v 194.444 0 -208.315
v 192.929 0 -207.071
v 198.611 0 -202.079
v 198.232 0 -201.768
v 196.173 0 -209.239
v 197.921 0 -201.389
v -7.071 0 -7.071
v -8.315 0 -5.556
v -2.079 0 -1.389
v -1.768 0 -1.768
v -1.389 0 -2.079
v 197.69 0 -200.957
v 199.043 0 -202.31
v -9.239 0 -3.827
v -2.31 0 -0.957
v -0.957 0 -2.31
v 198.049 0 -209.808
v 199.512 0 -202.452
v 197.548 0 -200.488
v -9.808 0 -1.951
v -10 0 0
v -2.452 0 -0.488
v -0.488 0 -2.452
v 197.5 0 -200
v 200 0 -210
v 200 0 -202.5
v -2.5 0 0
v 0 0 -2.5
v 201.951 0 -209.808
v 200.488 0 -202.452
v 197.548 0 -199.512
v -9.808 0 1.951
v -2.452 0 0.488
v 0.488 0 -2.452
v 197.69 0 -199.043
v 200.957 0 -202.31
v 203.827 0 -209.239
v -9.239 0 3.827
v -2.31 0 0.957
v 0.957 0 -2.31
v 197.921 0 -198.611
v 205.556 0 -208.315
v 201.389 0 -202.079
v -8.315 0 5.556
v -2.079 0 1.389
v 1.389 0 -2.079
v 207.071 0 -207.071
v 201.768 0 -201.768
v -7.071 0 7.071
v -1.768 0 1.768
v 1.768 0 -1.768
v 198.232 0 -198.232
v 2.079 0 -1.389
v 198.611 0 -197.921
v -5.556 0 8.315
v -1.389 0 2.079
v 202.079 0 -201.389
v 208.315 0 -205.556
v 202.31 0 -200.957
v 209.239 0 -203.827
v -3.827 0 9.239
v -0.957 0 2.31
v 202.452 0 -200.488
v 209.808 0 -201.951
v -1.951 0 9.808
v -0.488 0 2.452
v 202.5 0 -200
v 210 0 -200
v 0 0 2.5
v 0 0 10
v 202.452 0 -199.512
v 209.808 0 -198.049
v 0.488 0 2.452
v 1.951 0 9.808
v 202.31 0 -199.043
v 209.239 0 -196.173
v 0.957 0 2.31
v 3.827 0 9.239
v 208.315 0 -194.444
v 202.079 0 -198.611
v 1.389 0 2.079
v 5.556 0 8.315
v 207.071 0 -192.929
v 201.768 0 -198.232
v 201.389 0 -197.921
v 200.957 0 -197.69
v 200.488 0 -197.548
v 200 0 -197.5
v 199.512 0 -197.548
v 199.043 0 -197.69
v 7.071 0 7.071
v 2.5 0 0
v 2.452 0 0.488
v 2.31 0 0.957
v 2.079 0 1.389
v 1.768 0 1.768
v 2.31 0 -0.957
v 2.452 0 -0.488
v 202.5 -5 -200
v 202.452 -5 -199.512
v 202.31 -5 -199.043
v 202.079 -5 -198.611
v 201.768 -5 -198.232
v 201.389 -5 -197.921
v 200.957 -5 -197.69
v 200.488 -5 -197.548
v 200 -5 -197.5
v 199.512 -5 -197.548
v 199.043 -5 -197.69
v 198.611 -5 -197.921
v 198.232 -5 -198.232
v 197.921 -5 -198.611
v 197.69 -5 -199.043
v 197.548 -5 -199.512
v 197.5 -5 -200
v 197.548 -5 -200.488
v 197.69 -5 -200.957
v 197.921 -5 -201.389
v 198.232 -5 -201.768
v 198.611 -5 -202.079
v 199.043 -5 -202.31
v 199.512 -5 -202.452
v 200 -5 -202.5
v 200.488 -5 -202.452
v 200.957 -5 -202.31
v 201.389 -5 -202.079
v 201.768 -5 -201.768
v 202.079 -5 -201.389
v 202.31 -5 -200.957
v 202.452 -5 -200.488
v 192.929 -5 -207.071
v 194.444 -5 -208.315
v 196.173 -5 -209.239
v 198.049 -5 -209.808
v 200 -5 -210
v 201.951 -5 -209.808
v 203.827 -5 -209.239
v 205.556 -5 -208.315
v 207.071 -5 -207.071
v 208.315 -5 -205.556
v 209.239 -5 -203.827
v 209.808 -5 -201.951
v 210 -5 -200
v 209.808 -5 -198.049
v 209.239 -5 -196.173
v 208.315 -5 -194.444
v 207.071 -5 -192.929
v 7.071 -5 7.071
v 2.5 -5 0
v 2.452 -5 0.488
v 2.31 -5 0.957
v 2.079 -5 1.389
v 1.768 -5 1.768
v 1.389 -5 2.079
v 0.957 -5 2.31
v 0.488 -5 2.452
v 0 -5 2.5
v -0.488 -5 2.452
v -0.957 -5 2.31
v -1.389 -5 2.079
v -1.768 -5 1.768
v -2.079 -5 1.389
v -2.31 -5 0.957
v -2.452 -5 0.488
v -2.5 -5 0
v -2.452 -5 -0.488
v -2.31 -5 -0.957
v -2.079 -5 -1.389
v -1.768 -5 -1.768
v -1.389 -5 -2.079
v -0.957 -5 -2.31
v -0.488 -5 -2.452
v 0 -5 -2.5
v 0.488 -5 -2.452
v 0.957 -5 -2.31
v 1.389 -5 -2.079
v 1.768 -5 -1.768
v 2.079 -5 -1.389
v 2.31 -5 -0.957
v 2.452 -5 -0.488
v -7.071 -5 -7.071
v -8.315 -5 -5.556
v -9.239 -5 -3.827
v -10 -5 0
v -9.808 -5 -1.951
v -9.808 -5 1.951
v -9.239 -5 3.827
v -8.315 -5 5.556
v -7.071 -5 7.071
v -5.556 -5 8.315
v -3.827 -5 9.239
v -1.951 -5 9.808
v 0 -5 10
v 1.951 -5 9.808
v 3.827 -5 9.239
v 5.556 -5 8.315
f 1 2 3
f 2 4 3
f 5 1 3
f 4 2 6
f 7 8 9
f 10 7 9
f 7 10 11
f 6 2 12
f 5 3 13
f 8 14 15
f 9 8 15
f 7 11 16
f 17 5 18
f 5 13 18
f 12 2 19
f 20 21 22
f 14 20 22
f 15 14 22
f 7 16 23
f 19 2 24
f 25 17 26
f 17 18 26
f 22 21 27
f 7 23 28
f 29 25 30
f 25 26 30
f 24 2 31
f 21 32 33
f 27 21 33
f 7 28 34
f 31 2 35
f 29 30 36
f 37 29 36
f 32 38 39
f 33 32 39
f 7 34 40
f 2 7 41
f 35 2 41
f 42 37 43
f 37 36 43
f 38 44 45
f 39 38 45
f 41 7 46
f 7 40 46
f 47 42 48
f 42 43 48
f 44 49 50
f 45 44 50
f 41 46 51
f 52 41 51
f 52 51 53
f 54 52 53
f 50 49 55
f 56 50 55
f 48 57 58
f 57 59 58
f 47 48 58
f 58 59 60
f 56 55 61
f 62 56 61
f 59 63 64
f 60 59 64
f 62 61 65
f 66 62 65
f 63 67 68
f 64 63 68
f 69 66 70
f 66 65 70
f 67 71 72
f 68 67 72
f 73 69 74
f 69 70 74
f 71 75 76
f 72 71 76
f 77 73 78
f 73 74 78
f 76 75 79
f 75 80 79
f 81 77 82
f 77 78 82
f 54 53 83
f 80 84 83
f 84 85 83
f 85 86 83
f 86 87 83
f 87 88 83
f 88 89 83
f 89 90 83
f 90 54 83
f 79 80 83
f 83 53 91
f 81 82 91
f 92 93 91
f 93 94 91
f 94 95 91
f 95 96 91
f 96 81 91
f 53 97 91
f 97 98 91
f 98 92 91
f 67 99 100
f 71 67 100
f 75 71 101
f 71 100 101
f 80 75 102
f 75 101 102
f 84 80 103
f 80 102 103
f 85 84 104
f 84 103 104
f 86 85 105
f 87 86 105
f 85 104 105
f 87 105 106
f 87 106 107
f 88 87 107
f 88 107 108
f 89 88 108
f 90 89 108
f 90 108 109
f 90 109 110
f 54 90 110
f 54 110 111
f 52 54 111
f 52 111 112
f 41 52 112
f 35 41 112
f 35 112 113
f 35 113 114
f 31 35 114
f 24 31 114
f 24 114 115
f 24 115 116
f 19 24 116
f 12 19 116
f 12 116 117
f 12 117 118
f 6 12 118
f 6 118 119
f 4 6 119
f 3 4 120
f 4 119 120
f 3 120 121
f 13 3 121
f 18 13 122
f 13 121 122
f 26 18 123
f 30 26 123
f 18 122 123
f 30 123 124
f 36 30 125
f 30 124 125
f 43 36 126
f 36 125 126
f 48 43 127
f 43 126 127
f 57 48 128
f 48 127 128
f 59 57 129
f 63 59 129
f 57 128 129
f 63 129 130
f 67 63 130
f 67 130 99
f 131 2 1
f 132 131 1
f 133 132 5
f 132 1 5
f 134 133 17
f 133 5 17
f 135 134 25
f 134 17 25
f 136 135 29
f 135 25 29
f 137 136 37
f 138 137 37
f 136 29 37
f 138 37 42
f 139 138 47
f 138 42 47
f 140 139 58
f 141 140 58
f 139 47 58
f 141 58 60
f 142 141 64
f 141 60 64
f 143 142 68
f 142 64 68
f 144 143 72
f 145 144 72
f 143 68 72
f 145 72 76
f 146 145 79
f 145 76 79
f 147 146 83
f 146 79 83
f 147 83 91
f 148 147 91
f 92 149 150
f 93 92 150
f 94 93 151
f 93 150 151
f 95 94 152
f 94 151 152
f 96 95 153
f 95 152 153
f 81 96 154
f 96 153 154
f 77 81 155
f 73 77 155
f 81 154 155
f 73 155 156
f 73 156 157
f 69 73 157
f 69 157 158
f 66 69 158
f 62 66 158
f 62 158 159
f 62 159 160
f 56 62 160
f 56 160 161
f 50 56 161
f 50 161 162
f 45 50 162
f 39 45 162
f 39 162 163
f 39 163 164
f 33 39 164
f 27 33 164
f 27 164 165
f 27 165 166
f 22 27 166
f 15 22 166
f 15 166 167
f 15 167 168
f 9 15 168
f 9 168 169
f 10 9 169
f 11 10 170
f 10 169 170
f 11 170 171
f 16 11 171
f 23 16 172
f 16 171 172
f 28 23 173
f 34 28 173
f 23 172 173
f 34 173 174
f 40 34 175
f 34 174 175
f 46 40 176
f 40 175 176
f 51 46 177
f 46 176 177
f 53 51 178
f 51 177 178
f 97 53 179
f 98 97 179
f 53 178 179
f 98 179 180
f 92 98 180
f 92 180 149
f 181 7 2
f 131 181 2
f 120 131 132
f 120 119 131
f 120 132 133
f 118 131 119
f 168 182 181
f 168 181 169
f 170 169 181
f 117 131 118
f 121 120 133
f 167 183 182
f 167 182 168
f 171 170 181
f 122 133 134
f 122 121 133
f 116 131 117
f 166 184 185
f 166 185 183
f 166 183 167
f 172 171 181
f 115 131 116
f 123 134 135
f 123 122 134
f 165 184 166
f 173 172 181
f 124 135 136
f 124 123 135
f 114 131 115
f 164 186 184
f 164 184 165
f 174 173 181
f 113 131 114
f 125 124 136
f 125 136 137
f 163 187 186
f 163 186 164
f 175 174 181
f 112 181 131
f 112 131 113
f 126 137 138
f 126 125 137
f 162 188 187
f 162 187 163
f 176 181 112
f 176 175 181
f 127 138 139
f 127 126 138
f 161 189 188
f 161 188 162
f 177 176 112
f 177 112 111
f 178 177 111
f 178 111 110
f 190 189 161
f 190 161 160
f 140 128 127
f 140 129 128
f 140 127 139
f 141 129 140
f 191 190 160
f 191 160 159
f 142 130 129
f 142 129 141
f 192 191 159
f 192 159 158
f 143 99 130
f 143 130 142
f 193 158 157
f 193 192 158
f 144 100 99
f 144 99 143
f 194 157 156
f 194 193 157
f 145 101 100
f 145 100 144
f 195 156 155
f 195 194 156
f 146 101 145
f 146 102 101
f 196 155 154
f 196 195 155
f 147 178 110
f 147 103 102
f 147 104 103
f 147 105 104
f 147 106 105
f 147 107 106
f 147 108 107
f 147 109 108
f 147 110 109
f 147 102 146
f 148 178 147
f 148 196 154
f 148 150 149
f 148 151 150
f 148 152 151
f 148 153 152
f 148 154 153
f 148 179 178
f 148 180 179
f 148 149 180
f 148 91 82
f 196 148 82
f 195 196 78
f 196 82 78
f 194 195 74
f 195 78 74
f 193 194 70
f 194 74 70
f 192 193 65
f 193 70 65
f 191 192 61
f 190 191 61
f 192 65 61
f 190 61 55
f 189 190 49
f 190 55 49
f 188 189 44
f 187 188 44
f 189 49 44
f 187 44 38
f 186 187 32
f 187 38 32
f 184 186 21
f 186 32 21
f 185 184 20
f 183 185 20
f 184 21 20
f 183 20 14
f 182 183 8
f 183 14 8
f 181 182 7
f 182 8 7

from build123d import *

# Parameters (mm, degrees)
F1_DEPTH = 5
F2_R     = 2.5
F3_DEPTH = 25
F4_R     = 2.5
F5_DEPTH = 25


with BuildPart() as f1:
    # F0 (on Front) → F1 (new body)
    with BuildSketch(Plane.XZ):
        with BuildLine():
            ThreePointArc((7.071068, 7.071068), (-7.071068, 7.071068), (-7.071068, -7.071068))
            Line((-7.071068, -7.071068), (7.071068, 7.071068))
        make_face()
        Polygon((7.071068, 7.071068), (-7.071068, -7.071068), (192.928932, -207.071068), (207.071068, -192.928932), align=None)
        with BuildLine():
            Line((207.071068, -192.928932), (192.928932, -207.071068))
            ThreePointArc((192.928932, -207.071068), (207.071068, -207.071068), (207.071068, -192.928932))
        make_face()
    extrude(amount=F1_DEPTH)

    # F2 (on face) → F3 (cut)
    with BuildSketch(Plane.XZ.offset(5)):
        Circle(F2_R)
    extrude(amount=-F3_DEPTH, mode=Mode.SUBTRACT)

    # F4 (on face) → F5 (cut)
    with BuildSketch(Plane.XZ.offset(5)):
        with Locations((200, -200)):
            Circle(F4_R)
    extrude(amount=-F5_DEPTH, mode=Mode.SUBTRACT)


solid = f1.part
